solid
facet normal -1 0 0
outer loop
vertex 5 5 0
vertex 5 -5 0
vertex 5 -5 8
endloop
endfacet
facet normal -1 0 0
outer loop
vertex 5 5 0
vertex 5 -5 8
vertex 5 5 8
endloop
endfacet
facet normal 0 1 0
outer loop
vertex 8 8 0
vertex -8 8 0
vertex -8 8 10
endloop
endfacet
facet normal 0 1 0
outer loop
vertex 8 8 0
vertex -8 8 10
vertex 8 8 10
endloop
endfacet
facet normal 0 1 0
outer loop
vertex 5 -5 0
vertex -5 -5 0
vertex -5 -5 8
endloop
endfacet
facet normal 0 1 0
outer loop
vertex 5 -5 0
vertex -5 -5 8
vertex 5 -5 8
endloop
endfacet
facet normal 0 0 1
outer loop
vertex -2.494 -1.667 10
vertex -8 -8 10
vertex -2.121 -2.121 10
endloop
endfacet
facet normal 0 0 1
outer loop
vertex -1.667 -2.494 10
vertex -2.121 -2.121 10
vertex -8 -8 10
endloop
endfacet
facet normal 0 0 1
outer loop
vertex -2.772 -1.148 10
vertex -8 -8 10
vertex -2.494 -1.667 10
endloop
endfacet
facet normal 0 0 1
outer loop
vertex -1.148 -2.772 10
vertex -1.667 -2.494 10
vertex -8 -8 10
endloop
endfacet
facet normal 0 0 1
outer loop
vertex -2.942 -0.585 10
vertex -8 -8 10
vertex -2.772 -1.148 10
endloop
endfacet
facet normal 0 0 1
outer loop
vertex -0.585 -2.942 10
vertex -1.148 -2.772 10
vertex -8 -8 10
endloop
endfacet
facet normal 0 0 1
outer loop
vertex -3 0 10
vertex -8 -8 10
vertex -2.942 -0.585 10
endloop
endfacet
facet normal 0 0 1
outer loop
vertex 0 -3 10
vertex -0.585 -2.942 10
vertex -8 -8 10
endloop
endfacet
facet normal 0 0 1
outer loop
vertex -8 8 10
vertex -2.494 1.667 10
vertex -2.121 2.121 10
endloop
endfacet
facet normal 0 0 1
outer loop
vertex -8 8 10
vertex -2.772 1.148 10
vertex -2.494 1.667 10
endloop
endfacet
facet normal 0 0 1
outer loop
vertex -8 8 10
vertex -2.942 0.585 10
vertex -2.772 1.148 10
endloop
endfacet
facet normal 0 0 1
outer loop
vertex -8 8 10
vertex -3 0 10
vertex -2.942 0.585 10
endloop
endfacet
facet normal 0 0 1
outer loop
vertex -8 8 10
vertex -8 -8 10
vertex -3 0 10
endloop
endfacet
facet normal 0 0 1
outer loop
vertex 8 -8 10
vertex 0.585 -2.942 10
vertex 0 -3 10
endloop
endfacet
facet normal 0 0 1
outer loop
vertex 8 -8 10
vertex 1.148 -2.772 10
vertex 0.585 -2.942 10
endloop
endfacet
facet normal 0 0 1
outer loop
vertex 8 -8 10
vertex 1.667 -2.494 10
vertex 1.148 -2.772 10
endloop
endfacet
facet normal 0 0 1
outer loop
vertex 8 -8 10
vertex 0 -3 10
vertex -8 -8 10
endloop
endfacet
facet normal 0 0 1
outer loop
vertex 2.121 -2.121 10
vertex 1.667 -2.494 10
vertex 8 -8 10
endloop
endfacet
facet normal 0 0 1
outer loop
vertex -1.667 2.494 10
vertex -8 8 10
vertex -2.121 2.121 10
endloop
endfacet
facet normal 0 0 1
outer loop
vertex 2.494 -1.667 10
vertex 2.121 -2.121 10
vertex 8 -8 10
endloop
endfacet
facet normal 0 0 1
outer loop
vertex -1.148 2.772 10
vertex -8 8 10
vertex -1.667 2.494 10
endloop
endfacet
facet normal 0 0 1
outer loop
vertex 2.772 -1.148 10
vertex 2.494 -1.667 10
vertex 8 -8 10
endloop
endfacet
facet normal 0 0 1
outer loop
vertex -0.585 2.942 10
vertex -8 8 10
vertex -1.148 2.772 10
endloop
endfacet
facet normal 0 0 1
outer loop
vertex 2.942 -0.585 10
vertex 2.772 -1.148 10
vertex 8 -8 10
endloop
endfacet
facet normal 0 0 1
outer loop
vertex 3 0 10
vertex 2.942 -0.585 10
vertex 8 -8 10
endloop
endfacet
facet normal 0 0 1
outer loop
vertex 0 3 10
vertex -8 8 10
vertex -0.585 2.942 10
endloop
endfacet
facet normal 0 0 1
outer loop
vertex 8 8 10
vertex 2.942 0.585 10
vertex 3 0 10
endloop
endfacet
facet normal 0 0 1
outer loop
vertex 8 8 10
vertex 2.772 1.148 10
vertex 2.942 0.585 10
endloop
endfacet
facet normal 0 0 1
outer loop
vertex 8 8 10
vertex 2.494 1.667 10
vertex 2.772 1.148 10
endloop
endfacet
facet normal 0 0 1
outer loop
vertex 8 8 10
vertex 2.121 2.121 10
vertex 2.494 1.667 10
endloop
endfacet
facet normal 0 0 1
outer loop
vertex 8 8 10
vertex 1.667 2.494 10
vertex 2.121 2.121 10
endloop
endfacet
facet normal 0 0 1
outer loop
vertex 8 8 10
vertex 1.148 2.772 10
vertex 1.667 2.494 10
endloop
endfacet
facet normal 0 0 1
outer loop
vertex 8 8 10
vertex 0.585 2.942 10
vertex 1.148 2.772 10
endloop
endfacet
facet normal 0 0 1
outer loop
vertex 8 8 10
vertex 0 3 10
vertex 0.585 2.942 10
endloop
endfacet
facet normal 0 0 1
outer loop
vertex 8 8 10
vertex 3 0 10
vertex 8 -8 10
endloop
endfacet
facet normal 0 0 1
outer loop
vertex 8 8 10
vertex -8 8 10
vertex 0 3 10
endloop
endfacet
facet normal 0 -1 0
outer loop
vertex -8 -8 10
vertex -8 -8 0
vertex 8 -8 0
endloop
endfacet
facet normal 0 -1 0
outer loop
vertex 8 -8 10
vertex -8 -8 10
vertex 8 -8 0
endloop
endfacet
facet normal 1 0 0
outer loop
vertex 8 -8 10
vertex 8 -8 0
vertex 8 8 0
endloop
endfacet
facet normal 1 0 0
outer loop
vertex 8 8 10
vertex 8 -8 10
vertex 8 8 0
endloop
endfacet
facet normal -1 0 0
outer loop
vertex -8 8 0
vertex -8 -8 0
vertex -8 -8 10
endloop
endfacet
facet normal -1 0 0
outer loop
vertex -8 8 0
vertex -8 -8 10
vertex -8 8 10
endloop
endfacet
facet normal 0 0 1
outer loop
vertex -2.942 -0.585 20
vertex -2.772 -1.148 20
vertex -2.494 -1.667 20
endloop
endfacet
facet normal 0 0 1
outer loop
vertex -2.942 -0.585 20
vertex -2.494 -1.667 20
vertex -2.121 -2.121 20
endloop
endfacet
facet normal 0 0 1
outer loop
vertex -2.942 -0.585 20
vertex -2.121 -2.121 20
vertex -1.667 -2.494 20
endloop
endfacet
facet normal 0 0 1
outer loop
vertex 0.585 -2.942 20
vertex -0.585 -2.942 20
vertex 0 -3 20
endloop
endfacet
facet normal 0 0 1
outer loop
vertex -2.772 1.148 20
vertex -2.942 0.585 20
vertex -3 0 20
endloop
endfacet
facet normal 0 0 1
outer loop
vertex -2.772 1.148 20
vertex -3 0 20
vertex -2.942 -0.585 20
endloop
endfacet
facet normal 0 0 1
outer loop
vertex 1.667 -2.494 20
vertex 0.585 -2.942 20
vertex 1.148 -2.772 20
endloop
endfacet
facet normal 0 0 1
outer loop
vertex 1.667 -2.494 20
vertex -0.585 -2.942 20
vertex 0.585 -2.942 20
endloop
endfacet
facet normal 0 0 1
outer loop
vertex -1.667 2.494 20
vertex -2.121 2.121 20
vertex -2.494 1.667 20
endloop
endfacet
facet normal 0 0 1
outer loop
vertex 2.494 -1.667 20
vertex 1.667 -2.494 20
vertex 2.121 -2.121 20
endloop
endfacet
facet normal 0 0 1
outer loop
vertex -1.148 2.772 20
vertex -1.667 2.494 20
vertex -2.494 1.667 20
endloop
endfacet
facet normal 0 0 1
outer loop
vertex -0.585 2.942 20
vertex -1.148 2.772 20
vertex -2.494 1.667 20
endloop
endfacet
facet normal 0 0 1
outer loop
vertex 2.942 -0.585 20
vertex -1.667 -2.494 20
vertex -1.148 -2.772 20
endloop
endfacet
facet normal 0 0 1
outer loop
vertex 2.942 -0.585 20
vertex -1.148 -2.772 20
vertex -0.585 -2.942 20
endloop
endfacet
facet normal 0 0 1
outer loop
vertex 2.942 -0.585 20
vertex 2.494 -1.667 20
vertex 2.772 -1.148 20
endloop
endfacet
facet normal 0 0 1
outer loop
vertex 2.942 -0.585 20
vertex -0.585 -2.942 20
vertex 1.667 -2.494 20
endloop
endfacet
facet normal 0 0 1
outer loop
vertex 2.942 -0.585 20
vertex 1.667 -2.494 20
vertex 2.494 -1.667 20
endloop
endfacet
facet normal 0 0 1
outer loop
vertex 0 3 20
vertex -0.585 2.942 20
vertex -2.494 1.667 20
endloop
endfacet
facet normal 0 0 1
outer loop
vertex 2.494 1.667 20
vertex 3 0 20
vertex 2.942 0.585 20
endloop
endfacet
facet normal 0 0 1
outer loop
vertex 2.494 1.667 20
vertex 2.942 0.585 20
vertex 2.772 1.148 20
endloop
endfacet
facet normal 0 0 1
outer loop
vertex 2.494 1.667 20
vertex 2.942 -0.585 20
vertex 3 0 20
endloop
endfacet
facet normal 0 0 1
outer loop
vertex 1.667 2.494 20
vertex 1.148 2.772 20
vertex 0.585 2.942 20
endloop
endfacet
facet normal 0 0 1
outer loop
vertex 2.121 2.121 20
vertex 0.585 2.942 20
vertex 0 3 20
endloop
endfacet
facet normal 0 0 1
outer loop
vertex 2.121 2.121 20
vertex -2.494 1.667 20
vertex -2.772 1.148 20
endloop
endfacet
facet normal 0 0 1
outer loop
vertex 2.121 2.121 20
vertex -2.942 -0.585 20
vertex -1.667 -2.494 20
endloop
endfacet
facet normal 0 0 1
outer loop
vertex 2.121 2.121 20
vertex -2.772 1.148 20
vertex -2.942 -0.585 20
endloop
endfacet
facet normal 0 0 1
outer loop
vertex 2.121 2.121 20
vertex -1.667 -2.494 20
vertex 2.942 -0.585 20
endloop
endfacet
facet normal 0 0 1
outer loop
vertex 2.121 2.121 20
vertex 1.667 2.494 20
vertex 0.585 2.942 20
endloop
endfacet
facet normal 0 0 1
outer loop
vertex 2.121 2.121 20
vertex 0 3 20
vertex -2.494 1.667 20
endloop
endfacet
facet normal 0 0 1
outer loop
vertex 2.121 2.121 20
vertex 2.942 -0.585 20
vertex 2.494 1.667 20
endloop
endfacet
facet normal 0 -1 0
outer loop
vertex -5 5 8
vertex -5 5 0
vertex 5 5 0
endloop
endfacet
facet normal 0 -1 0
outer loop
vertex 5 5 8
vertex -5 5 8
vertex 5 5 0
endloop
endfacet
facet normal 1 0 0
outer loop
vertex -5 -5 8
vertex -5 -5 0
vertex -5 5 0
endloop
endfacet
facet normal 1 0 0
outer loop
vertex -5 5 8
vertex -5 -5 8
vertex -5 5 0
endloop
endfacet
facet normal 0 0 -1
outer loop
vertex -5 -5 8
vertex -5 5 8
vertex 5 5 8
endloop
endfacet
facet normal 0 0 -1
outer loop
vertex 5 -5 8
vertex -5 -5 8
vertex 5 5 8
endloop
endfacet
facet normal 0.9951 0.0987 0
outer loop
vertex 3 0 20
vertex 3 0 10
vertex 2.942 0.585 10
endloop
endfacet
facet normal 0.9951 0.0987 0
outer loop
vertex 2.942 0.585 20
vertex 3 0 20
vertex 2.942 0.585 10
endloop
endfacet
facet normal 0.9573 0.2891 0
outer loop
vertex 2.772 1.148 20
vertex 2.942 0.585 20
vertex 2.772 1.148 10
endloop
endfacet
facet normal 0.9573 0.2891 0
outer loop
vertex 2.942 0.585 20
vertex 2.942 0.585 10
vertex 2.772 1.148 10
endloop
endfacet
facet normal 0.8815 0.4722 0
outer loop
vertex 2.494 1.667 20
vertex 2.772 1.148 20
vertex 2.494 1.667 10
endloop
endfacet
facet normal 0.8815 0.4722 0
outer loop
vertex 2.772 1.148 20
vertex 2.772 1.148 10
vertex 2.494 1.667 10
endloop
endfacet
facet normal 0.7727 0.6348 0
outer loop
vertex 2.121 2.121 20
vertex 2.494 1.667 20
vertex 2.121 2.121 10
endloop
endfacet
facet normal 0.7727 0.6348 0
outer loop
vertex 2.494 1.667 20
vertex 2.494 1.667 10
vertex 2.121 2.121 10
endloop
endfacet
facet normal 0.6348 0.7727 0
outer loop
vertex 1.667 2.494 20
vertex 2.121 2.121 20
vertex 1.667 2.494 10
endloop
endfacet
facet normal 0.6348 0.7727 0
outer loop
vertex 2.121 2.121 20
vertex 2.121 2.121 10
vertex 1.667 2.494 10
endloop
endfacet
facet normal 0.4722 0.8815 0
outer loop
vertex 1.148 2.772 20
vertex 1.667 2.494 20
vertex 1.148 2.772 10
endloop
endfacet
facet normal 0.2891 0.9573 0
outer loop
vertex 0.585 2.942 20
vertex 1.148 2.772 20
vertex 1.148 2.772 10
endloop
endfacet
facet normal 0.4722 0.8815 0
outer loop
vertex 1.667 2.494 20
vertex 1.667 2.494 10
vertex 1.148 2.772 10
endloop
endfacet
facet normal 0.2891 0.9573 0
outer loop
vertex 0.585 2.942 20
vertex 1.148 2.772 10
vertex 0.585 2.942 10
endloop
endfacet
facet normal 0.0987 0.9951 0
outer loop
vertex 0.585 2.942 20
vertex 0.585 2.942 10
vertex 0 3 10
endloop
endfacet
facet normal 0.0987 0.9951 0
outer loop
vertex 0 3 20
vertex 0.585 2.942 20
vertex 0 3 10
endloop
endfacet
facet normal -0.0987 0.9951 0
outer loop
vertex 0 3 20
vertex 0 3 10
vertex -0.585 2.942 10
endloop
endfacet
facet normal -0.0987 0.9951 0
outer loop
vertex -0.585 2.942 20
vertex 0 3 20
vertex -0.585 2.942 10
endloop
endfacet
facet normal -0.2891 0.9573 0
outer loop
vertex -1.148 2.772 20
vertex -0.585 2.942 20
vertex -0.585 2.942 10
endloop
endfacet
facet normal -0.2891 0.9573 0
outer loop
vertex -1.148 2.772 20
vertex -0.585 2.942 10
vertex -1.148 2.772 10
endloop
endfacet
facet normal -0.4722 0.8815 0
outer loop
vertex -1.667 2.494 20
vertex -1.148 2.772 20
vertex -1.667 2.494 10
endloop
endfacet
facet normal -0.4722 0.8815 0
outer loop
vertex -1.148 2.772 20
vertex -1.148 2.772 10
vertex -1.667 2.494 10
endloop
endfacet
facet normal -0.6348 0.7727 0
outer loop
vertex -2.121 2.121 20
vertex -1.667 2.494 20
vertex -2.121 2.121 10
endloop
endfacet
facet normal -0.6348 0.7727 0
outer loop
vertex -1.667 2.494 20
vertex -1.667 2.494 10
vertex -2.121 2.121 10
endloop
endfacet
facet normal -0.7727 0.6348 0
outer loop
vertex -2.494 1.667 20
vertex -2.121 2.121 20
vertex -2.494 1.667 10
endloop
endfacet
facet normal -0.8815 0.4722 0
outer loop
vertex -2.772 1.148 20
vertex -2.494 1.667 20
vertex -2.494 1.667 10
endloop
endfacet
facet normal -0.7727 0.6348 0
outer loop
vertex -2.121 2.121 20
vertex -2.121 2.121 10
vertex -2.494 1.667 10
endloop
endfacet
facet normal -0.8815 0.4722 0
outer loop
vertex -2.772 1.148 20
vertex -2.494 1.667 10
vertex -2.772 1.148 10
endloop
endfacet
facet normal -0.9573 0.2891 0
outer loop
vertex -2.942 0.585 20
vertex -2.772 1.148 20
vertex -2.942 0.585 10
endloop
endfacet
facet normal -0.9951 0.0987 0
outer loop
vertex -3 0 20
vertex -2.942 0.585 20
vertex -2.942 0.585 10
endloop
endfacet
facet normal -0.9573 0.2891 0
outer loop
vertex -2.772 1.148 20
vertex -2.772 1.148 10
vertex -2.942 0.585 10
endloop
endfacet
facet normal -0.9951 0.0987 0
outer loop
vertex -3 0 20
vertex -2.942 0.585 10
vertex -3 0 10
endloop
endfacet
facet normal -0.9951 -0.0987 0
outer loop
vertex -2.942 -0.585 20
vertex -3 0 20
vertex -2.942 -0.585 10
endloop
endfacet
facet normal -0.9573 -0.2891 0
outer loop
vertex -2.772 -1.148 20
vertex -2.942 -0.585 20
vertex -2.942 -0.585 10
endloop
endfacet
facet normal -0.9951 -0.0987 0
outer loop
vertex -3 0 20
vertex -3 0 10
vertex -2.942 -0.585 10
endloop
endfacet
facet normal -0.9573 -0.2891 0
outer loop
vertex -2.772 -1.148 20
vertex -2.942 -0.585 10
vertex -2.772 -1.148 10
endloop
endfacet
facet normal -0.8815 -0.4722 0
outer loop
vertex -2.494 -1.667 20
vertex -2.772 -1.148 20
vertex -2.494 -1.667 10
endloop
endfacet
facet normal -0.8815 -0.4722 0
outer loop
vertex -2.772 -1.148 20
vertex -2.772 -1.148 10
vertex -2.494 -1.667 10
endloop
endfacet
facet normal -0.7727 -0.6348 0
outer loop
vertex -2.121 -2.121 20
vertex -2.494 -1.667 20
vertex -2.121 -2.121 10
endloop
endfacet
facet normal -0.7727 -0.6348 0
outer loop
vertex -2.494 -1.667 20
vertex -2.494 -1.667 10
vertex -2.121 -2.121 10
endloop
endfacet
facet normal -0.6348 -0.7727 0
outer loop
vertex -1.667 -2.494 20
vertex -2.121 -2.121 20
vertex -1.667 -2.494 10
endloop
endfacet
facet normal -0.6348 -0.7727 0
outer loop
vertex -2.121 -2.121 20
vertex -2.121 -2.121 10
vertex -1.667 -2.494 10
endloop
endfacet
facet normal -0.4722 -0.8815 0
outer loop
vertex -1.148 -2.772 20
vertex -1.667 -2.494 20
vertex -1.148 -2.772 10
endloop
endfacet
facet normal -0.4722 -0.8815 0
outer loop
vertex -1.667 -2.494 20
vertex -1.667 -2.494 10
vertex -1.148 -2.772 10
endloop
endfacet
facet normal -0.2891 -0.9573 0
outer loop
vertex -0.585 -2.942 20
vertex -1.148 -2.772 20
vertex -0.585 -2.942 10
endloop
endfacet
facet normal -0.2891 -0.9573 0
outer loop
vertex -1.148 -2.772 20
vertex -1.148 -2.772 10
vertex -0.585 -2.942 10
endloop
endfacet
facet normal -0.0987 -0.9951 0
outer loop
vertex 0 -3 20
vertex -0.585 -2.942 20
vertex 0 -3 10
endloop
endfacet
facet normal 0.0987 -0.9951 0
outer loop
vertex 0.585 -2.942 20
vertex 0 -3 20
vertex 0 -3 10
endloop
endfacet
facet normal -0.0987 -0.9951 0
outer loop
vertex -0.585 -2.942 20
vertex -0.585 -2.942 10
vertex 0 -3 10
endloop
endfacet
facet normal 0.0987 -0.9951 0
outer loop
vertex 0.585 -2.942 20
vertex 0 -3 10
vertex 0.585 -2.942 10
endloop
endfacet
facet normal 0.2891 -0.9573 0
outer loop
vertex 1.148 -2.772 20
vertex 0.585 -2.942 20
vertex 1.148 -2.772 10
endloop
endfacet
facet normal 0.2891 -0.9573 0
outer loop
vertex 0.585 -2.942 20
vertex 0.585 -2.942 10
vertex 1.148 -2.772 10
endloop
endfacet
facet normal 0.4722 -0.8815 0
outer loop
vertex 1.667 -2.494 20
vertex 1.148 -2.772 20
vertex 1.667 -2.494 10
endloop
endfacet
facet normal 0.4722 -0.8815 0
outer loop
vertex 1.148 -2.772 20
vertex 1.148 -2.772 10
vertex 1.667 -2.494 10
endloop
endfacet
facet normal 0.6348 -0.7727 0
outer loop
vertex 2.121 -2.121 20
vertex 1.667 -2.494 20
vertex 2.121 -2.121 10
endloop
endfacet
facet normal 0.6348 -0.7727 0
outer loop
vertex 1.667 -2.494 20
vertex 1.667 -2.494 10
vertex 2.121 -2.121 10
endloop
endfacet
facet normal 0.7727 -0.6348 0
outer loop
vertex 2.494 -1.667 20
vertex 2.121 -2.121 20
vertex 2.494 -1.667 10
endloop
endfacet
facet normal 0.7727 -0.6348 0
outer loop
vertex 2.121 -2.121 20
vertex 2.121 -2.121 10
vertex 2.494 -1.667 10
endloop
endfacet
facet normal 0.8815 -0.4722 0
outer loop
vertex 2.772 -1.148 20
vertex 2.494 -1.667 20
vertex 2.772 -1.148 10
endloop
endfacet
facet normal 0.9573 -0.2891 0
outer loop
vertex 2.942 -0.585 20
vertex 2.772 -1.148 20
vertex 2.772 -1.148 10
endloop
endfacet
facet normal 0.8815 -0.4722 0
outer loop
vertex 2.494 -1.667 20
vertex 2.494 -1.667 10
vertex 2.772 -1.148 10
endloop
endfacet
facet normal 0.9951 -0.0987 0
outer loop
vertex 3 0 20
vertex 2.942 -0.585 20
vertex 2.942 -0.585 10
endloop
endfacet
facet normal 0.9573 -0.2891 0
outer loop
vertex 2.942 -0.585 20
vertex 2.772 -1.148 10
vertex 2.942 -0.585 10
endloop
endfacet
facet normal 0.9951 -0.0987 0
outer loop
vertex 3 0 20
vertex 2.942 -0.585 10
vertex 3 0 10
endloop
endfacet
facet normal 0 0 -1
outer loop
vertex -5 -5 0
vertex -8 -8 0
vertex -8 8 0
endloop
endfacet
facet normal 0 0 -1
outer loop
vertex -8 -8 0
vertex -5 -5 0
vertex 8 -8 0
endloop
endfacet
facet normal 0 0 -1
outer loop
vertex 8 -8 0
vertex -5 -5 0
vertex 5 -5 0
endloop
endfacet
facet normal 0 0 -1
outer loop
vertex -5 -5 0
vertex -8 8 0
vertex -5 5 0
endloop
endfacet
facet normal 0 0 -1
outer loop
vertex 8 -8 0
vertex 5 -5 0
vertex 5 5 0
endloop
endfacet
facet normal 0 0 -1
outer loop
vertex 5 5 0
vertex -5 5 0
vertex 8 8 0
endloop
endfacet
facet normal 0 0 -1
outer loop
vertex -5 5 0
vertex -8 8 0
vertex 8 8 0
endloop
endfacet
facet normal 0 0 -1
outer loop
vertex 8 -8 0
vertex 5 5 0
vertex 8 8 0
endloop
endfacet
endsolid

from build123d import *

# Parameters (mm, degrees)
BOX001_W       = 10
BOX001_H       = 10
BOX001_DEPTH   = 8
CYLINDER_R     = 3
CYLINDER_DEPTH = 10
BOX_W          = 16
BOX_H          = 16
BOX_DEPTH      = 10


with BuildPart() as cube001:
    # Box001 → Box001 (new body)
    with BuildSketch(Plane(origin=(-5, -5, 0), x_dir=(1, 0, 0), z_dir=(0, 0, 1))):
        with Locations((5, 5)):
            Rectangle(BOX001_W, BOX001_H)
    extrude(amount=BOX001_DEPTH)


with BuildPart() as cylinder:
    # Cylinder → Cylinder (new body)
    with BuildSketch(Plane.XY.offset(10)):
        Circle(CYLINDER_R)
    extrude(amount=CYLINDER_DEPTH)


with BuildPart() as cut:
    # Box → Box (new body)
    with BuildSketch(Plane(origin=(-8, -8, 0), x_dir=(1, 0, 0), z_dir=(0, 0, 1))):
        with Locations((8, 8)):
            Rectangle(BOX_W, BOX_H)
    extrude(amount=BOX_DEPTH)

    # Fusion: union Cylinder
    add(cylinder.part)

    # Cut: cut Cube001
    add(cube001.part, mode=Mode.SUBTRACT)


solid = cut.part
